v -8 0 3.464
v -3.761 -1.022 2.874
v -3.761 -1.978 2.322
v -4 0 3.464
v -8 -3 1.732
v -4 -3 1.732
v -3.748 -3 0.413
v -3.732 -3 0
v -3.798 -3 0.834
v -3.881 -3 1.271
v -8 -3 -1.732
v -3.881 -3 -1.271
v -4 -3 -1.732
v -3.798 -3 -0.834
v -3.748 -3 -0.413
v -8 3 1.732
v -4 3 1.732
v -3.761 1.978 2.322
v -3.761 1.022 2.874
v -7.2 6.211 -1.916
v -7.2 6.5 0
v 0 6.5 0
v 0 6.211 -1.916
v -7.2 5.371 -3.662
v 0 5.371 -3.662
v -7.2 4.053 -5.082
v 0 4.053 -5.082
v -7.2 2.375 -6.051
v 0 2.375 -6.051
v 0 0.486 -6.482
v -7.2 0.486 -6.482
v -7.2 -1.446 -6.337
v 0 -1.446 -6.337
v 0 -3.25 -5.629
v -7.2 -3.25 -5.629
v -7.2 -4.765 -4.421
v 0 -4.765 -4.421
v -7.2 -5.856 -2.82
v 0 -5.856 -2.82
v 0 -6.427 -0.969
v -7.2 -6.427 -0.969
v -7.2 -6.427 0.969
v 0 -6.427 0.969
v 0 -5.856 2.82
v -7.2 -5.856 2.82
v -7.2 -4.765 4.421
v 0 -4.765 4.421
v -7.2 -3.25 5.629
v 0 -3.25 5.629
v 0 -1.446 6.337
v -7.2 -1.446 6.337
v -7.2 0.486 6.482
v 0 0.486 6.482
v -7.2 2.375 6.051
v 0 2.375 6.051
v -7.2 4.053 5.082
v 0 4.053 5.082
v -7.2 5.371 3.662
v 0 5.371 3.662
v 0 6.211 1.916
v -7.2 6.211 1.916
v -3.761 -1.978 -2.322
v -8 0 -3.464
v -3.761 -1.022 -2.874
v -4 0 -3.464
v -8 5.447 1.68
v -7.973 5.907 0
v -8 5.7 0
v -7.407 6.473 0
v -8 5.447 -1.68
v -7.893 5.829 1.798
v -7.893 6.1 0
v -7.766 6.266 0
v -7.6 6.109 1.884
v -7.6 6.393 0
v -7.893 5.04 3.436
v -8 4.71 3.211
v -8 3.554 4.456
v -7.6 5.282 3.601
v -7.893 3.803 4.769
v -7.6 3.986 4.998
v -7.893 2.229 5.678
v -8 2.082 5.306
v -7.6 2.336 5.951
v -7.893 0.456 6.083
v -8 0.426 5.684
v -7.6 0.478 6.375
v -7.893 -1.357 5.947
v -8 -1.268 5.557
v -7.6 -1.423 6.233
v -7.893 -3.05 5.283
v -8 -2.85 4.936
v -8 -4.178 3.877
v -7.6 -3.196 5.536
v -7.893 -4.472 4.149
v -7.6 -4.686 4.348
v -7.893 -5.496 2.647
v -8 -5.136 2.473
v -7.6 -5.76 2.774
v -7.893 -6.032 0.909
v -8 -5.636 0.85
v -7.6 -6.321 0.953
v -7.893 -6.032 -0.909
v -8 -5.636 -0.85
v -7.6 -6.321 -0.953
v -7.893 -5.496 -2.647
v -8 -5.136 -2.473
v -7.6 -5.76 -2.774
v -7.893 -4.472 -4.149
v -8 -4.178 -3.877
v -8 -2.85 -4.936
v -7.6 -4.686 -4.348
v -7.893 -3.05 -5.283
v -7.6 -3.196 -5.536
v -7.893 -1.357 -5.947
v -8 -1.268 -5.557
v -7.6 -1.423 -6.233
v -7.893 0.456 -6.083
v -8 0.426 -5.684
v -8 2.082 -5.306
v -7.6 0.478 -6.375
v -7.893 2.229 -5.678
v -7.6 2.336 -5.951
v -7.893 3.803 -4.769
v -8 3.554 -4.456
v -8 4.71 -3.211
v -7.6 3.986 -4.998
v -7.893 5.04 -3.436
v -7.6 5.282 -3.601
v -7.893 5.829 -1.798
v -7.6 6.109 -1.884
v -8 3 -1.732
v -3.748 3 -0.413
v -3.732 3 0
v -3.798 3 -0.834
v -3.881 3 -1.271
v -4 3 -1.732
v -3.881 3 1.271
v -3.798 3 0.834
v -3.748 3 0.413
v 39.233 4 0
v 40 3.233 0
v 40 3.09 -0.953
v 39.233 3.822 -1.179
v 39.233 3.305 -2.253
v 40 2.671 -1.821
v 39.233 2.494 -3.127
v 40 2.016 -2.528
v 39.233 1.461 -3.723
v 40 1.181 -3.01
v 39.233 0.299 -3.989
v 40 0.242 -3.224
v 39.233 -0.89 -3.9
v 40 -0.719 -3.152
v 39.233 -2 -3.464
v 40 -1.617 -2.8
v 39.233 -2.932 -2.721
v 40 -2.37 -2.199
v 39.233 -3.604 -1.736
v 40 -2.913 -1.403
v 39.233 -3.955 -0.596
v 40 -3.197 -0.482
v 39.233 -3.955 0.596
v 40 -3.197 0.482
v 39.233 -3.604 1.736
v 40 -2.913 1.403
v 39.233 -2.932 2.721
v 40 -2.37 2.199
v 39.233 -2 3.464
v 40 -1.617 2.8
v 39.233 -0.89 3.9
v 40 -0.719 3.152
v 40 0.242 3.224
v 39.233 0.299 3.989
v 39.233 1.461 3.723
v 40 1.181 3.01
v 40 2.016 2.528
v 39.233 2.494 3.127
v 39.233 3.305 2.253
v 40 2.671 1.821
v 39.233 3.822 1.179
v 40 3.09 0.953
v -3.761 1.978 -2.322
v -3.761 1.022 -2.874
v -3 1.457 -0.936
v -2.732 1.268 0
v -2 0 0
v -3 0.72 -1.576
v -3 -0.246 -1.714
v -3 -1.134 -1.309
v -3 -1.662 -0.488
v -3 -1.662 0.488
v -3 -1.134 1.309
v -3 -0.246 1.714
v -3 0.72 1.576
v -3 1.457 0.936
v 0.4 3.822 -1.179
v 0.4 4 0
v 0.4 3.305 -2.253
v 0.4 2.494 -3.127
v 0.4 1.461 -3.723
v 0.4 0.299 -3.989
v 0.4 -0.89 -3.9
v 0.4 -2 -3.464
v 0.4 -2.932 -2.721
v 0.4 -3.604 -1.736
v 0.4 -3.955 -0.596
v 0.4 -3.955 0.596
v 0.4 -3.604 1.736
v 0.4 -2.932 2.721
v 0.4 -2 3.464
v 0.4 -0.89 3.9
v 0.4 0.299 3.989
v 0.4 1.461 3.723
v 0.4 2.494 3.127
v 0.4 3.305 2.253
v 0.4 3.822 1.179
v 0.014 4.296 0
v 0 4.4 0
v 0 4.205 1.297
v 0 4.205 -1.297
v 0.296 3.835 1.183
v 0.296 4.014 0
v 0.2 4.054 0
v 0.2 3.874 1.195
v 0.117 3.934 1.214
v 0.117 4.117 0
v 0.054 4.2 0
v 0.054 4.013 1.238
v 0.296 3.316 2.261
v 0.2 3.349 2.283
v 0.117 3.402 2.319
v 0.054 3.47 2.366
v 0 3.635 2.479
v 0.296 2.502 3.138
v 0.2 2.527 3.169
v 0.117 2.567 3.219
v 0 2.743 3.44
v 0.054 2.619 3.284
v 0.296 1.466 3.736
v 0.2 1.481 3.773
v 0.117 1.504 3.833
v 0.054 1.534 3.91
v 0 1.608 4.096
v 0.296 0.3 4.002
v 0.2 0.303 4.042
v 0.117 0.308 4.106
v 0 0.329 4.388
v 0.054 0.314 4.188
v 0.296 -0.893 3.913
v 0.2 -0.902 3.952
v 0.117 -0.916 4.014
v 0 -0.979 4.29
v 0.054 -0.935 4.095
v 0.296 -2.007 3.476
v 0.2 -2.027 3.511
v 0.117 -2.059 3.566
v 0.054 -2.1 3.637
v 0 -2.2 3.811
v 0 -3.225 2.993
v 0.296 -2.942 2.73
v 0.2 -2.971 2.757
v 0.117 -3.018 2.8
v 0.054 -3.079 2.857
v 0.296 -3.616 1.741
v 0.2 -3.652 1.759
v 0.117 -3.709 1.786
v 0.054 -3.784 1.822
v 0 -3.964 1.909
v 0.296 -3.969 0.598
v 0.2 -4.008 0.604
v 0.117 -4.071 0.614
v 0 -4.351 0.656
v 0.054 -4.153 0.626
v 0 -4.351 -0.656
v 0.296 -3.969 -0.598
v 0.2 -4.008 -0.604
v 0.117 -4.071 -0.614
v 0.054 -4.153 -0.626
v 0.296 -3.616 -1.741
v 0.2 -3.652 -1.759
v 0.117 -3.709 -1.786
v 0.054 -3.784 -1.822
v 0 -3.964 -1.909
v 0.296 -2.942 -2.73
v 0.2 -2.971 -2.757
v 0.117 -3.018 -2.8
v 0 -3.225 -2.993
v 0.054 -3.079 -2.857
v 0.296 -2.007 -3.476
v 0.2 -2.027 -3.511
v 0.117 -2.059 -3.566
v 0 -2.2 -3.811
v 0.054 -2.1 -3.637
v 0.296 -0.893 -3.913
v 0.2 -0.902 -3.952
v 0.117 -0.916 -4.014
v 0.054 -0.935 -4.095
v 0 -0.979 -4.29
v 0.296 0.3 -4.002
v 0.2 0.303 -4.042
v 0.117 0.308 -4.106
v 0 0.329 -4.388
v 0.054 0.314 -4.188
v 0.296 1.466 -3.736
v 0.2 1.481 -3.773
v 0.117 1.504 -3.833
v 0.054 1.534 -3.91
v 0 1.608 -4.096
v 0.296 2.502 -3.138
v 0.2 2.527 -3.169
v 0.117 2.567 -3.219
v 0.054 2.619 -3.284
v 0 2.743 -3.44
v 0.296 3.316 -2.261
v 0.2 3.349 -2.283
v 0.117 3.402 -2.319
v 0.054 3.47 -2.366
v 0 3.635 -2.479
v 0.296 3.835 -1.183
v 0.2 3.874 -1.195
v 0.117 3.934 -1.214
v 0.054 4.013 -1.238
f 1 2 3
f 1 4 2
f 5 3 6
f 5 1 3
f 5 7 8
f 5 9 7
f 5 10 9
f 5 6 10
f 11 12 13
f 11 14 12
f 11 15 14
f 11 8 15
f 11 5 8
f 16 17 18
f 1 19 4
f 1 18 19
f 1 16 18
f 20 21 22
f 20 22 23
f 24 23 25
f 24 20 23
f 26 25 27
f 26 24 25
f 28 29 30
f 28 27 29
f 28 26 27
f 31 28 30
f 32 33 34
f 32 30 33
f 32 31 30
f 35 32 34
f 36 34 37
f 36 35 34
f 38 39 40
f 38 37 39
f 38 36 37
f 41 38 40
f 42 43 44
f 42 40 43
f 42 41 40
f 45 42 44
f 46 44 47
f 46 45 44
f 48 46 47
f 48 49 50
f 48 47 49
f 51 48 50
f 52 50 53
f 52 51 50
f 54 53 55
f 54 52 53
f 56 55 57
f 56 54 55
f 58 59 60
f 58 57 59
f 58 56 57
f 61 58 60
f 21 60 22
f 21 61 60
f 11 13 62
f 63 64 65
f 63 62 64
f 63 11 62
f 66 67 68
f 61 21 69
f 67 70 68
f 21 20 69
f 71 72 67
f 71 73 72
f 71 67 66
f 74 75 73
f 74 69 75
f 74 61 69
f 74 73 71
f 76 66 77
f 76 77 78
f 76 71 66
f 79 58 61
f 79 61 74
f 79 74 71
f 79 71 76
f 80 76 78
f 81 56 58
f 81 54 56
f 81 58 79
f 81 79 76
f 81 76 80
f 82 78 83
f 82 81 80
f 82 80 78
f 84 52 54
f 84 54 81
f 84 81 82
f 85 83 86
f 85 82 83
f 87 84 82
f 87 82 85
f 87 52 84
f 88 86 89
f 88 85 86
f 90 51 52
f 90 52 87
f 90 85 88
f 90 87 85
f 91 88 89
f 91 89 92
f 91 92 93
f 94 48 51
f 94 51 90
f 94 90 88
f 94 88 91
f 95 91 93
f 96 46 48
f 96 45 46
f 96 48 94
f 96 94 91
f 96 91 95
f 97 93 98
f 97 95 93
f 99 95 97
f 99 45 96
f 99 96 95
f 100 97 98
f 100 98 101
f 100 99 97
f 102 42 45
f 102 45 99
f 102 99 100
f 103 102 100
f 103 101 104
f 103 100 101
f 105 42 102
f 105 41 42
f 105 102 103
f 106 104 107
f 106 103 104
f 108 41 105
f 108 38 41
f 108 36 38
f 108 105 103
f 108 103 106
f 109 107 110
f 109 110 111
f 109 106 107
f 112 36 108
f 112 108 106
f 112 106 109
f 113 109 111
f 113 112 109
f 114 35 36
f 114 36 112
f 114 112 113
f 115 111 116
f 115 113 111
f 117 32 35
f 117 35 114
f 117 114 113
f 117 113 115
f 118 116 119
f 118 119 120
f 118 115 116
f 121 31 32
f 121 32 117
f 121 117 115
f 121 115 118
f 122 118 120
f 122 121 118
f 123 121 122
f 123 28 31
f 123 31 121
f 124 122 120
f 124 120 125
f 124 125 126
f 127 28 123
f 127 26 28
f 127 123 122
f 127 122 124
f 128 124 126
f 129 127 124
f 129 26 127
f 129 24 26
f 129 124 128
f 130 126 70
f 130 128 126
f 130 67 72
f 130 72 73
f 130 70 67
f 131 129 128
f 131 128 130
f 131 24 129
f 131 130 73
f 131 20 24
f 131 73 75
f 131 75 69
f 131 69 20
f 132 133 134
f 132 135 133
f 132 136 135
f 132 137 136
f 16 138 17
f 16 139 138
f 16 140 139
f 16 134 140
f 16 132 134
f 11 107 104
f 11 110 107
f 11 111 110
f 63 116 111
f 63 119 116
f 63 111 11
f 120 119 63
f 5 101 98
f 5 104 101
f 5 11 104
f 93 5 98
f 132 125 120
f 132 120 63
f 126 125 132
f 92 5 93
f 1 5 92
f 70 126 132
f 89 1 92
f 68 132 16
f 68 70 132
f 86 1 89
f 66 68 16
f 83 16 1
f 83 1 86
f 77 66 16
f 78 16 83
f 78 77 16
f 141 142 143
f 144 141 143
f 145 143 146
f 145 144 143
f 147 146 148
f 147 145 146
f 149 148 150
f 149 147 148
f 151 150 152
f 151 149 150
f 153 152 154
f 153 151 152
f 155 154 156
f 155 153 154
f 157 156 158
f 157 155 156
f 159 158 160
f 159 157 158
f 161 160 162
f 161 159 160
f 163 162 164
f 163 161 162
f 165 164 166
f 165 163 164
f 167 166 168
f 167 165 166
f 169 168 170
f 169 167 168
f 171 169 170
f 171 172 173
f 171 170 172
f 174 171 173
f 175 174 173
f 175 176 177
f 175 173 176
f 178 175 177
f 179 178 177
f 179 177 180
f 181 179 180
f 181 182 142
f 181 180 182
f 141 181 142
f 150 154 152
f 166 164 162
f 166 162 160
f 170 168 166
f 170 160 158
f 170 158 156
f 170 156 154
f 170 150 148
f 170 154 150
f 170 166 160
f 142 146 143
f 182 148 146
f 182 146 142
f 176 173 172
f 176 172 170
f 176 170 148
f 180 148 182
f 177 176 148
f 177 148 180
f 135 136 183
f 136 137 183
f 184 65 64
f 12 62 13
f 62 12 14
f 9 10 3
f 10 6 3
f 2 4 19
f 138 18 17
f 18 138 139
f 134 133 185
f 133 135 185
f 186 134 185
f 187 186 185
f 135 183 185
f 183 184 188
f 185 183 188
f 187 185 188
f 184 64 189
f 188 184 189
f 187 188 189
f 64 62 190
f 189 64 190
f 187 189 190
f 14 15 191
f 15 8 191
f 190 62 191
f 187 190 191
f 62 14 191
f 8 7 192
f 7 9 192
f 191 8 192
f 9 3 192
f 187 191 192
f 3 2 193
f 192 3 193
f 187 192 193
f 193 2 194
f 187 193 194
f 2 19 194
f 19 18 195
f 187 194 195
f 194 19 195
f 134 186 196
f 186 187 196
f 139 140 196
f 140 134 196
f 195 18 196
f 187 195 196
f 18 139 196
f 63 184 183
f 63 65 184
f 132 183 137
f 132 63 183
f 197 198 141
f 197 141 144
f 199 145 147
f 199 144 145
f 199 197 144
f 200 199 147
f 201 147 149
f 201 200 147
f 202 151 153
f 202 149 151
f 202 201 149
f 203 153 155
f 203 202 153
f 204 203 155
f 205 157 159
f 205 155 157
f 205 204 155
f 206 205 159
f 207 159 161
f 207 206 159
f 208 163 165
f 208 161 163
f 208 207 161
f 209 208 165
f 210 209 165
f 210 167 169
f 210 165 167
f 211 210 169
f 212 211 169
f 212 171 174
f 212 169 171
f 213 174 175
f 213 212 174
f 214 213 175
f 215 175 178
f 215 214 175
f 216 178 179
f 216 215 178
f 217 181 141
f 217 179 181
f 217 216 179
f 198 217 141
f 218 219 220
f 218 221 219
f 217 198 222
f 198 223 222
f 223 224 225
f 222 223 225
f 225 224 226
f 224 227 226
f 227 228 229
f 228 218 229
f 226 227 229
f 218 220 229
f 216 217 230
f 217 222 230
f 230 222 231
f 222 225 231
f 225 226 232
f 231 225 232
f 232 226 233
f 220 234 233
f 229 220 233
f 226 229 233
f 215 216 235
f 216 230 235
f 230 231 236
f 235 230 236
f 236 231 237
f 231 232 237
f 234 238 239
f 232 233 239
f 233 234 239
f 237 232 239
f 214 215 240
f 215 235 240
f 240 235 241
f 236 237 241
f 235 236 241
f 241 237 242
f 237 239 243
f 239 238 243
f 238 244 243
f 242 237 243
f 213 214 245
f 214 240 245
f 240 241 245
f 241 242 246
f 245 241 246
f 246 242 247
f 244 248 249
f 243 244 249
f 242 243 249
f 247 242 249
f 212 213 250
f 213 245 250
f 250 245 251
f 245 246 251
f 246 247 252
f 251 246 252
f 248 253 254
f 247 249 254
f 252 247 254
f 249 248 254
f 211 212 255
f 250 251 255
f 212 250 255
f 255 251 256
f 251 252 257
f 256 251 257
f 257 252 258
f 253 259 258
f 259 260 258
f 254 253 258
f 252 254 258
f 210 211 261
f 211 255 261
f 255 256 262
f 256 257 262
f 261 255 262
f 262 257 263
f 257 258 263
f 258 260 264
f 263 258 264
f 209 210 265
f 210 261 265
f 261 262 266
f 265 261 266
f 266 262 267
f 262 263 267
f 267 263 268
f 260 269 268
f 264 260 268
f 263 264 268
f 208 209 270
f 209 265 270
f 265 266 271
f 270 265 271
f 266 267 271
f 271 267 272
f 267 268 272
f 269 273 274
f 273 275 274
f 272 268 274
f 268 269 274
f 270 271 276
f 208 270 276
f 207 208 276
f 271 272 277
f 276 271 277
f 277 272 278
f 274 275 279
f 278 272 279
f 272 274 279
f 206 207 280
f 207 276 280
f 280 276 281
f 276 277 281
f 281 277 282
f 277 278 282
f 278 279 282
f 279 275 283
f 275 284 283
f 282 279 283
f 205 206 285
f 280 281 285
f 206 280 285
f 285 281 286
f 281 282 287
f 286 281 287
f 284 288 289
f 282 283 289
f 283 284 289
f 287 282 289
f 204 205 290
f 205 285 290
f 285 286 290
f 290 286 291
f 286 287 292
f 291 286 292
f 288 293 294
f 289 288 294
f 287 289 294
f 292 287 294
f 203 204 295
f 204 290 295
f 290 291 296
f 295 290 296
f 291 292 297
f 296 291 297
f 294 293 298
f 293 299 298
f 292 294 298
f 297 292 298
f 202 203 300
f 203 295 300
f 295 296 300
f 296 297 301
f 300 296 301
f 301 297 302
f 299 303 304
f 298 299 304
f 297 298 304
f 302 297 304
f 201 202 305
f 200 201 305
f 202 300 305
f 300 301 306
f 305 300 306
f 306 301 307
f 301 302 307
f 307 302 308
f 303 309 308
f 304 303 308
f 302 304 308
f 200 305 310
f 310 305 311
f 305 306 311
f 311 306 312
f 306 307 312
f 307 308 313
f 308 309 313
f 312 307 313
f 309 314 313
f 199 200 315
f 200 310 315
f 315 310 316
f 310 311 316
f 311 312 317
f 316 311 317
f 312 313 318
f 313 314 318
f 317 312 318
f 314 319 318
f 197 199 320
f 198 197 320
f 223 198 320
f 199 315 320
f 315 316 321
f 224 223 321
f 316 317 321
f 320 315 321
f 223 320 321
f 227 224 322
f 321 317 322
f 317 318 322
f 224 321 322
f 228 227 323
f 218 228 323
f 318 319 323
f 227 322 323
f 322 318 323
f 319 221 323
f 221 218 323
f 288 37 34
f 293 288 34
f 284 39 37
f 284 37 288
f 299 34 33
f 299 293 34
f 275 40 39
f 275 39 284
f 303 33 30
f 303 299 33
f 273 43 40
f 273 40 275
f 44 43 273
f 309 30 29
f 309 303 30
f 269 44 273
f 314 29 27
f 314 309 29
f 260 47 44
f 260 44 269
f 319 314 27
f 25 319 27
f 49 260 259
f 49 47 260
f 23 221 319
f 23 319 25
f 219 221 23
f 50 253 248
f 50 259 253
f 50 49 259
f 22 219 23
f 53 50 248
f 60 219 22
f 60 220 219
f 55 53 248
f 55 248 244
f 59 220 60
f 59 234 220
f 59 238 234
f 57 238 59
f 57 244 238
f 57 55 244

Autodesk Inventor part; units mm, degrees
ref_plane "YZ Plane" through (0, 0, 0) normal (1, 0, 0) x (0, 1, 0)
ref_plane "XZ Plane" through (0, 0, 0) normal (0, 1, 0) x (-1, 0, 0)
sketch "Sketch1" plane through (0, 0, 0) normal (0, 0, 1) x (1, 0, 0)
  line L0 (-2, 0) -> (40, 0)
  line L1 (40, 0) -> (40, 4)
  line L2 (40, 4) -> (3.125, 4)
  line L3 (3.125, 4) -> (2.3581, 4)
  line L4 (2.3581, 4) -> (0, 4)
  line L5 (0, 4) -> (0, 6.5)
  line L6 (0, 6.5) -> (-8, 6.5)
  line L7 (-8, 6.5) -> (-8, 3.4641)
  line L8 (-8, 3.4641) -> (-4, 3.4641)
  line L9 (-4, 3.4641) -> (-2, 0)
  line L10 (-17.6, 0) -> (49.6, 0) projected
  line L11 (0, -1.3) -> (0, 7.8) projected
  line L12 (3.125, 4) -> (0, 4) construction
  dimension "d1" = 36.875
  dimension "d2" = 0.7669
  dimension "d3" = 8
  dimension "d4" = 4
  dimension "d5" = 60
  dimension "d6" = 8
  dimension "d7" = 8
  dimension "d8" = 6.9282
  dimension "d9" = 13
  dimension "d26" = 40
revolve "Body" add sketch "Sketch1" angle 360 about axis through (-2, 0, 0) along (1, 0, 0)
sketch "Sketch2" plane through (-8, 0, 0) normal (-1, 0, 0) x (0, 0, 1)
  circle A0 centre (0, 0) radius 3.4641 projected
  line L0 (0, -9.1) -> (0, 9.1) projected
  line L1 (-9.1, 0) -> (9.1, 0) projected
  line L2 (3.4641, 0) -> (1.7321, -3)
  line L3 (1.7321, -3) -> (-1.7321, -3)
  line L4 (-1.7321, -3) -> (-3.4641, 0)
  line L5 (-3.4641, 0) -> (-1.7321, 3)
  line L6 (-1.7321, 3) -> (1.7321, 3)
  line L7 (1.7321, 3) -> (3.4641, 0)
extrude "Slot" add sketch "Sketch2" against normal up to next contours L7 A0 | A0 L2 | L6 L0 A0 | A0 L0 L3 | L0 L6 A0 | A0 L3 L0 | L4 A0 | A0 L5
fillet "Fillet1" radius 0.8 1 edges at (-8, -6.5, 0)
thread "Thread" size "M8x1.25" class "6g" standard "ISO Metric profile" length 36.875
chamfer "Chamfer1" distance 0.7668 distance2 0.7668 1 edges at (40, -4, 0) measured on face at (40, -0.998, -0.8842)
ref_plane "Work Plane1" through (29, 0, 0) normal (0, -1, 0) x (1, 0, 0)
fillet "Fillet2" radius 0.4 1 edges at (0, -4, 0)
equation "\"d3\" = KOH"
equation "\"d4\" = INTI"
equation "\"d6\" = GD"
equation "\"d7\" = BDM"
equation "\"d8\" = 1.1547 * SW"
equation "\"d9\" = KOD"
equation "\"d30\" = R"
equation "\"d17\" = RR"
equation "\"d15\" = -0.5 * SPD + 0.5 * GD"
equation "\"d16\" = GUL"
equation "\"GD\" = NND"
equation "\"NLG\" = 25"
equation "\"GEL\" = 21.875"
equation "\"KOD\" = 13"
equation "\"KOH\" = 8"
equation "\"INTI\" = 4"
equation "\"GAL\" = 0.61345 * PTC"
equation "\"GUL\" = 0.61345 * PTC"
equation "\"BDM\" = NND"
equation "\"SW\" = 6"
equation "\"RR\" = 0.8"
equation "\"SPD\" = NND - 1.2269 * PTC"
equation "\"R\" = 0.4"
equation "\"TOA\" = 30deg"
equation "\"GD1\" = THREADDIA - 1.2269 * PTC"
equation "\"THREADDIA\" = 8"
equation "\"FAWI\" = 45deg"
equation "\"ANG\" = 120deg"
equation "\"PTC\" = 1.25"
equation "\"NND\" = 8"
equation "\"E0\" = 1.155 * SW"
properties part number "Allen Key 8x40mm" material "Steel, Mild"
